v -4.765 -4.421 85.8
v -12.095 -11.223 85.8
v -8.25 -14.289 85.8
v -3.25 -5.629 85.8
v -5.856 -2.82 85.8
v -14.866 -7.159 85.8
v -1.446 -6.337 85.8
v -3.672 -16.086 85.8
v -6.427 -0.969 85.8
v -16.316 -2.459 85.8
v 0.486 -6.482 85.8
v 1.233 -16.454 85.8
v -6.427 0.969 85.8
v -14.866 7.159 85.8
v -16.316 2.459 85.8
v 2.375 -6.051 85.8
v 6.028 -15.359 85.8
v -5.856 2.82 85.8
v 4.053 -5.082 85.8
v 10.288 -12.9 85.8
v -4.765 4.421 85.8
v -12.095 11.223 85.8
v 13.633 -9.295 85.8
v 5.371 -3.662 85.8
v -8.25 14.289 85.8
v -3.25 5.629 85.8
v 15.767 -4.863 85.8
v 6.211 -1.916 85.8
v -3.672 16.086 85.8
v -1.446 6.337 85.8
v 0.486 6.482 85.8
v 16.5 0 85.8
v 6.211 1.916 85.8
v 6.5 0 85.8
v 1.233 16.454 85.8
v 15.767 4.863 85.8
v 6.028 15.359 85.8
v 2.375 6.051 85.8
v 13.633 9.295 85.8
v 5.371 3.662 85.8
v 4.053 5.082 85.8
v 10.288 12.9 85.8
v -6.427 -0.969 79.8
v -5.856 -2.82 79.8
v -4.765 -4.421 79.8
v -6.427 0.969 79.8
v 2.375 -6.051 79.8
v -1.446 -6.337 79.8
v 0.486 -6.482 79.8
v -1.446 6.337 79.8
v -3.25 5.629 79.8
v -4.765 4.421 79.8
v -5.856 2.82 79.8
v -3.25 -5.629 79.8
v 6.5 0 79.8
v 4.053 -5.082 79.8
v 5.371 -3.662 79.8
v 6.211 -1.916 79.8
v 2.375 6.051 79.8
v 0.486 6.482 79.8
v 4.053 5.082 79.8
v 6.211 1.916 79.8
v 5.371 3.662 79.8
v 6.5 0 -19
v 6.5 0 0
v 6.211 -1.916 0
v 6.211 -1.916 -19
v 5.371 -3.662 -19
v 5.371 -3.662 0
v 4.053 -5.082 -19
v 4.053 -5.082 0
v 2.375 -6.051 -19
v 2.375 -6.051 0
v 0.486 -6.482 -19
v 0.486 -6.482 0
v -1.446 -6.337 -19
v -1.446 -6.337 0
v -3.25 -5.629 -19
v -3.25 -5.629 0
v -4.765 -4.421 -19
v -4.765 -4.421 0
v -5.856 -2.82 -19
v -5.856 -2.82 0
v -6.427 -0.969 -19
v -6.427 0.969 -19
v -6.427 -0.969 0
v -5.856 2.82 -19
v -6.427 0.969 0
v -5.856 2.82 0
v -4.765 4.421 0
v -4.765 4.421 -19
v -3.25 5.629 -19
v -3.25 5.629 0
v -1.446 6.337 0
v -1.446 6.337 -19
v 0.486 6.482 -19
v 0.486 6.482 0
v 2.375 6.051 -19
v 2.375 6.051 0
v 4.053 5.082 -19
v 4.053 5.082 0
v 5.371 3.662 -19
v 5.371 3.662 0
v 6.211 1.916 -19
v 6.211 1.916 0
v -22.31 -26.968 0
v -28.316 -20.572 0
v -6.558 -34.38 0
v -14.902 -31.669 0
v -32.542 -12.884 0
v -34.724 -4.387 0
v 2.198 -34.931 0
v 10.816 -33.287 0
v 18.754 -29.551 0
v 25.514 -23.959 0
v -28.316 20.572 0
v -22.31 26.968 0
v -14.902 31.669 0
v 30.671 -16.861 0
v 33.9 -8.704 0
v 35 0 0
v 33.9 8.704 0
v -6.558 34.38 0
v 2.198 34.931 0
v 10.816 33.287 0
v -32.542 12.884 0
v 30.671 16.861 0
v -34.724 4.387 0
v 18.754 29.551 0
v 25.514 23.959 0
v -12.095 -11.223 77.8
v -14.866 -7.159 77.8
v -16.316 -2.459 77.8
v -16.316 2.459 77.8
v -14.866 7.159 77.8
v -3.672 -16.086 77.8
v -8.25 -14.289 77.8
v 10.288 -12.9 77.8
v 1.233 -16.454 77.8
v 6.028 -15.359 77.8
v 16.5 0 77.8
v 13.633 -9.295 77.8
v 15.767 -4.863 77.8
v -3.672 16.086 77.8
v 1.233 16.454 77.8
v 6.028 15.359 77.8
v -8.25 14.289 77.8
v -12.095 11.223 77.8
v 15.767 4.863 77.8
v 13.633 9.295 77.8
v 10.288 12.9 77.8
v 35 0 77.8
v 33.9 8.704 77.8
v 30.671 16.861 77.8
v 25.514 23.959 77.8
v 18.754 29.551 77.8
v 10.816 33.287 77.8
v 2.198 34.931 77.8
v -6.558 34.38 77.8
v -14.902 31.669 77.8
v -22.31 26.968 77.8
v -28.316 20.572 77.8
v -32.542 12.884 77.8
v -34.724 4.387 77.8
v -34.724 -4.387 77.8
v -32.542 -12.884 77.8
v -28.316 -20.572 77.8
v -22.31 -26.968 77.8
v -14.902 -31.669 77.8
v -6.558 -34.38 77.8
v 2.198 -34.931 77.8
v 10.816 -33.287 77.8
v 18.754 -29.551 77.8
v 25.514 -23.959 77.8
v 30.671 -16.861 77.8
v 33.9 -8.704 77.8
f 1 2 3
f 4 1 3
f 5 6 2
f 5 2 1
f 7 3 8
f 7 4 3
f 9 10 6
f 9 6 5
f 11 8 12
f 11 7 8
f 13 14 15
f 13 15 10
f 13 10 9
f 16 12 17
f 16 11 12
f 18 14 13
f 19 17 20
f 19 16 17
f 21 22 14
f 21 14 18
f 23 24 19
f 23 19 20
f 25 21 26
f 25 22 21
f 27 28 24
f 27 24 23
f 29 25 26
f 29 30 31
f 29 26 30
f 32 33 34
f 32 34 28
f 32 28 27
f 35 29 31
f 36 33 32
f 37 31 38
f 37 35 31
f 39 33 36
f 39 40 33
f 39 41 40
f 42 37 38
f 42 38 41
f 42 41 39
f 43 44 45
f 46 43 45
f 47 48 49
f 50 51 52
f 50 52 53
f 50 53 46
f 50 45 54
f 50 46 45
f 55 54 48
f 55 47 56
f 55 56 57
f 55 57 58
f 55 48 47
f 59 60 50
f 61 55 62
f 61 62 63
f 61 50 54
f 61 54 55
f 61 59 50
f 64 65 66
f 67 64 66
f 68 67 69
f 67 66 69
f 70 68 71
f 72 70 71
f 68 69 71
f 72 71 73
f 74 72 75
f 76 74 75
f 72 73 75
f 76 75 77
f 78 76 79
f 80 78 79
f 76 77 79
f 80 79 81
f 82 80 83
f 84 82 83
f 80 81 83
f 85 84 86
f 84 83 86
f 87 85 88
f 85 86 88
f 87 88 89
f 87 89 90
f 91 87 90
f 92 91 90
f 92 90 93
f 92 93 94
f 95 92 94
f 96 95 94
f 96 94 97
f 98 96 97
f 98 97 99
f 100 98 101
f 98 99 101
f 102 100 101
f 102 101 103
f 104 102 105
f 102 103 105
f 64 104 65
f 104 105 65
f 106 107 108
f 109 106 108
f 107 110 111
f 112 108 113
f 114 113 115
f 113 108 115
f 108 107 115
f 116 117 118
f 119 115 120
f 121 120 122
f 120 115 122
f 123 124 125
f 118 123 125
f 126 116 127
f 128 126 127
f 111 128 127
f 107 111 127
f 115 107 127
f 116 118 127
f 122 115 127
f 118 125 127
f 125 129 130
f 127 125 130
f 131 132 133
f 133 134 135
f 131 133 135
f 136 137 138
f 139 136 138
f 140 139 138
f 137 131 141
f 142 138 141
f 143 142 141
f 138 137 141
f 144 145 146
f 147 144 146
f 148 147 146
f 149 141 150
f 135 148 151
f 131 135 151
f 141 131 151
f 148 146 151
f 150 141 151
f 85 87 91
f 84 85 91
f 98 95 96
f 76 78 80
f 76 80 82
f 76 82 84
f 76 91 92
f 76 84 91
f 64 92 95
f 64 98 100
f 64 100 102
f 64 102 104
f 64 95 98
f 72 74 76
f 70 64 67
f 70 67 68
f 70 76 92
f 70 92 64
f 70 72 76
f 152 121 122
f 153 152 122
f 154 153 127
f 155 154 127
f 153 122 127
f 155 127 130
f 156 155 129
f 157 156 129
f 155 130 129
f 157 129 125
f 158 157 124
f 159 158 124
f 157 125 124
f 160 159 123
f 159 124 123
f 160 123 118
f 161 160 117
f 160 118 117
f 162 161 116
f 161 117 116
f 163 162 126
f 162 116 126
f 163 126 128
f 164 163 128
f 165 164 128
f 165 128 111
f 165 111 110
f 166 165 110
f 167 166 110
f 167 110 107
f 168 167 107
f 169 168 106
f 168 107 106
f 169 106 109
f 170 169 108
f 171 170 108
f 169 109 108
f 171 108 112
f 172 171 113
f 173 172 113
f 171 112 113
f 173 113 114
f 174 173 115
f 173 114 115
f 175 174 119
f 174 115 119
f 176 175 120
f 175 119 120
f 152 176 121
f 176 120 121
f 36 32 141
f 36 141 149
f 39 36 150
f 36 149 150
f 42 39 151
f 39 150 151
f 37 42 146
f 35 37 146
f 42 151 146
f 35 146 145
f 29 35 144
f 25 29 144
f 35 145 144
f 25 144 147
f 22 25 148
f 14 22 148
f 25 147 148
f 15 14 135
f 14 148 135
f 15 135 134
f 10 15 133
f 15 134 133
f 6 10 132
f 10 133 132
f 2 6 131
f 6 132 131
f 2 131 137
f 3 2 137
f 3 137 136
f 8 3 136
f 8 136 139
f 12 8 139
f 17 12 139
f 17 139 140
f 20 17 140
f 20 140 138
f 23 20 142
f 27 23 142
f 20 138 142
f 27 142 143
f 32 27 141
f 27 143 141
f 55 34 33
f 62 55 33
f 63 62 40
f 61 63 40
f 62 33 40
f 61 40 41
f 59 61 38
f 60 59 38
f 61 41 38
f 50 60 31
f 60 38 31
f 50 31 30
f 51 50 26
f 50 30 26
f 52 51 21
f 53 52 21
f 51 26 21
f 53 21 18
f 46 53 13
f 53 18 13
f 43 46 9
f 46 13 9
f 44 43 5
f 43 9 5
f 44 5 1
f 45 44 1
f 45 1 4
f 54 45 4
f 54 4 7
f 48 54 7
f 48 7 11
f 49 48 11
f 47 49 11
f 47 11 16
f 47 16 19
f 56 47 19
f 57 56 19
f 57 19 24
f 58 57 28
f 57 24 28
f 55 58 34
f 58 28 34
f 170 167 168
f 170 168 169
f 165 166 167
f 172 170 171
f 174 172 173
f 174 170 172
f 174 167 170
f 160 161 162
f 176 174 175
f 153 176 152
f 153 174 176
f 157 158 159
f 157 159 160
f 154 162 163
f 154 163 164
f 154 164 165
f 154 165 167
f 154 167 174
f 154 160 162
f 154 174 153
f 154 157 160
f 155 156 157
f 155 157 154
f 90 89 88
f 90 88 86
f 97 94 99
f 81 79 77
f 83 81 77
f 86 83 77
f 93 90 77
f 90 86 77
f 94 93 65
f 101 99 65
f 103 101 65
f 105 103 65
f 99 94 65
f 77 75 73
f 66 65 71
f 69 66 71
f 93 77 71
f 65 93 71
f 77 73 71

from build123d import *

# Parameters (mm, degrees)
F0_R     = 35
F1_DEPTH = 77.8
F2_R     = 16.5
F3_DEPTH = 8
F4_R     = 6.5
F5_DEPTH = 6
F6_R     = 6.5
F7_DEPTH = 19


with BuildPart() as f1:
    # F0 (on Top) → F1 (new body)
    with BuildSketch(Plane.XY):
        Circle(F0_R)
    extrude(amount=F1_DEPTH)


with BuildPart() as f3:
    # F2 (on face) → F3 (new body)
    with BuildSketch(Plane.XY.offset(77.8)):
        Circle(F2_R)
    extrude(amount=F3_DEPTH)

    # F4 (on face) → F5 (cut)
    with BuildSketch(Plane.XY.offset(85.8)):
        Circle(F4_R)
    extrude(amount=-F5_DEPTH, mode=Mode.SUBTRACT)


with BuildPart() as f7:
    # F6 (on face) → F7 (new body)
    with BuildSketch(Plane(origin=(0, 0, 0), x_dir=(1, 0, 0), z_dir=(0, 0, -1))):
        Circle(F6_R)
    extrude(amount=F7_DEPTH)


solid = Compound([f1.part, f3.part, f7.part])
